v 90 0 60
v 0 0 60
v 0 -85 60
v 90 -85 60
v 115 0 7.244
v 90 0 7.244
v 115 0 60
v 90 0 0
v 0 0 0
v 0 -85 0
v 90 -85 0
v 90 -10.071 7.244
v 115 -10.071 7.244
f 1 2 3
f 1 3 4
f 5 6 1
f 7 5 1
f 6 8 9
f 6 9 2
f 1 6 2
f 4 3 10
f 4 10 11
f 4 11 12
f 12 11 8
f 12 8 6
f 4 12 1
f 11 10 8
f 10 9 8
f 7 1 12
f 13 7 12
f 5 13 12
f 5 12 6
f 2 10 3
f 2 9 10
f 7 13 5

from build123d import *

# Parameters (mm, degrees)
F0_W      = 90
F0_H      = 60
F1_DEPTH  = 25
F1_FACE_W = 90
F1_FACE_H = 60
F2_DEPTH  = 60
F4_DEPTH  = 25


with BuildPart() as f1:
    # F0 (on Front) → F1 (new body)
    with BuildSketch(Plane.XZ):
        with Locations((45, 30)):
            Rectangle(F0_W, F0_H)
    extrude(amount=F1_DEPTH)

    # F1_face (on face) → F2 (join)
    with BuildSketch(Plane(origin=(45, -25, 30), x_dir=(1, 0, 0), z_dir=(0, -1, 0))):
        Rectangle(F1_FACE_W, F1_FACE_H)
    extrude(amount=F2_DEPTH)

    # F3 (on face) → F4 (join)
    with BuildSketch(Plane.YZ.offset(90)):
        Polygon((0, 7.243759), (0, 60), (-10.070629, 7.243759), align=None)
    extrude(amount=F4_DEPTH)


solid = f1.part
